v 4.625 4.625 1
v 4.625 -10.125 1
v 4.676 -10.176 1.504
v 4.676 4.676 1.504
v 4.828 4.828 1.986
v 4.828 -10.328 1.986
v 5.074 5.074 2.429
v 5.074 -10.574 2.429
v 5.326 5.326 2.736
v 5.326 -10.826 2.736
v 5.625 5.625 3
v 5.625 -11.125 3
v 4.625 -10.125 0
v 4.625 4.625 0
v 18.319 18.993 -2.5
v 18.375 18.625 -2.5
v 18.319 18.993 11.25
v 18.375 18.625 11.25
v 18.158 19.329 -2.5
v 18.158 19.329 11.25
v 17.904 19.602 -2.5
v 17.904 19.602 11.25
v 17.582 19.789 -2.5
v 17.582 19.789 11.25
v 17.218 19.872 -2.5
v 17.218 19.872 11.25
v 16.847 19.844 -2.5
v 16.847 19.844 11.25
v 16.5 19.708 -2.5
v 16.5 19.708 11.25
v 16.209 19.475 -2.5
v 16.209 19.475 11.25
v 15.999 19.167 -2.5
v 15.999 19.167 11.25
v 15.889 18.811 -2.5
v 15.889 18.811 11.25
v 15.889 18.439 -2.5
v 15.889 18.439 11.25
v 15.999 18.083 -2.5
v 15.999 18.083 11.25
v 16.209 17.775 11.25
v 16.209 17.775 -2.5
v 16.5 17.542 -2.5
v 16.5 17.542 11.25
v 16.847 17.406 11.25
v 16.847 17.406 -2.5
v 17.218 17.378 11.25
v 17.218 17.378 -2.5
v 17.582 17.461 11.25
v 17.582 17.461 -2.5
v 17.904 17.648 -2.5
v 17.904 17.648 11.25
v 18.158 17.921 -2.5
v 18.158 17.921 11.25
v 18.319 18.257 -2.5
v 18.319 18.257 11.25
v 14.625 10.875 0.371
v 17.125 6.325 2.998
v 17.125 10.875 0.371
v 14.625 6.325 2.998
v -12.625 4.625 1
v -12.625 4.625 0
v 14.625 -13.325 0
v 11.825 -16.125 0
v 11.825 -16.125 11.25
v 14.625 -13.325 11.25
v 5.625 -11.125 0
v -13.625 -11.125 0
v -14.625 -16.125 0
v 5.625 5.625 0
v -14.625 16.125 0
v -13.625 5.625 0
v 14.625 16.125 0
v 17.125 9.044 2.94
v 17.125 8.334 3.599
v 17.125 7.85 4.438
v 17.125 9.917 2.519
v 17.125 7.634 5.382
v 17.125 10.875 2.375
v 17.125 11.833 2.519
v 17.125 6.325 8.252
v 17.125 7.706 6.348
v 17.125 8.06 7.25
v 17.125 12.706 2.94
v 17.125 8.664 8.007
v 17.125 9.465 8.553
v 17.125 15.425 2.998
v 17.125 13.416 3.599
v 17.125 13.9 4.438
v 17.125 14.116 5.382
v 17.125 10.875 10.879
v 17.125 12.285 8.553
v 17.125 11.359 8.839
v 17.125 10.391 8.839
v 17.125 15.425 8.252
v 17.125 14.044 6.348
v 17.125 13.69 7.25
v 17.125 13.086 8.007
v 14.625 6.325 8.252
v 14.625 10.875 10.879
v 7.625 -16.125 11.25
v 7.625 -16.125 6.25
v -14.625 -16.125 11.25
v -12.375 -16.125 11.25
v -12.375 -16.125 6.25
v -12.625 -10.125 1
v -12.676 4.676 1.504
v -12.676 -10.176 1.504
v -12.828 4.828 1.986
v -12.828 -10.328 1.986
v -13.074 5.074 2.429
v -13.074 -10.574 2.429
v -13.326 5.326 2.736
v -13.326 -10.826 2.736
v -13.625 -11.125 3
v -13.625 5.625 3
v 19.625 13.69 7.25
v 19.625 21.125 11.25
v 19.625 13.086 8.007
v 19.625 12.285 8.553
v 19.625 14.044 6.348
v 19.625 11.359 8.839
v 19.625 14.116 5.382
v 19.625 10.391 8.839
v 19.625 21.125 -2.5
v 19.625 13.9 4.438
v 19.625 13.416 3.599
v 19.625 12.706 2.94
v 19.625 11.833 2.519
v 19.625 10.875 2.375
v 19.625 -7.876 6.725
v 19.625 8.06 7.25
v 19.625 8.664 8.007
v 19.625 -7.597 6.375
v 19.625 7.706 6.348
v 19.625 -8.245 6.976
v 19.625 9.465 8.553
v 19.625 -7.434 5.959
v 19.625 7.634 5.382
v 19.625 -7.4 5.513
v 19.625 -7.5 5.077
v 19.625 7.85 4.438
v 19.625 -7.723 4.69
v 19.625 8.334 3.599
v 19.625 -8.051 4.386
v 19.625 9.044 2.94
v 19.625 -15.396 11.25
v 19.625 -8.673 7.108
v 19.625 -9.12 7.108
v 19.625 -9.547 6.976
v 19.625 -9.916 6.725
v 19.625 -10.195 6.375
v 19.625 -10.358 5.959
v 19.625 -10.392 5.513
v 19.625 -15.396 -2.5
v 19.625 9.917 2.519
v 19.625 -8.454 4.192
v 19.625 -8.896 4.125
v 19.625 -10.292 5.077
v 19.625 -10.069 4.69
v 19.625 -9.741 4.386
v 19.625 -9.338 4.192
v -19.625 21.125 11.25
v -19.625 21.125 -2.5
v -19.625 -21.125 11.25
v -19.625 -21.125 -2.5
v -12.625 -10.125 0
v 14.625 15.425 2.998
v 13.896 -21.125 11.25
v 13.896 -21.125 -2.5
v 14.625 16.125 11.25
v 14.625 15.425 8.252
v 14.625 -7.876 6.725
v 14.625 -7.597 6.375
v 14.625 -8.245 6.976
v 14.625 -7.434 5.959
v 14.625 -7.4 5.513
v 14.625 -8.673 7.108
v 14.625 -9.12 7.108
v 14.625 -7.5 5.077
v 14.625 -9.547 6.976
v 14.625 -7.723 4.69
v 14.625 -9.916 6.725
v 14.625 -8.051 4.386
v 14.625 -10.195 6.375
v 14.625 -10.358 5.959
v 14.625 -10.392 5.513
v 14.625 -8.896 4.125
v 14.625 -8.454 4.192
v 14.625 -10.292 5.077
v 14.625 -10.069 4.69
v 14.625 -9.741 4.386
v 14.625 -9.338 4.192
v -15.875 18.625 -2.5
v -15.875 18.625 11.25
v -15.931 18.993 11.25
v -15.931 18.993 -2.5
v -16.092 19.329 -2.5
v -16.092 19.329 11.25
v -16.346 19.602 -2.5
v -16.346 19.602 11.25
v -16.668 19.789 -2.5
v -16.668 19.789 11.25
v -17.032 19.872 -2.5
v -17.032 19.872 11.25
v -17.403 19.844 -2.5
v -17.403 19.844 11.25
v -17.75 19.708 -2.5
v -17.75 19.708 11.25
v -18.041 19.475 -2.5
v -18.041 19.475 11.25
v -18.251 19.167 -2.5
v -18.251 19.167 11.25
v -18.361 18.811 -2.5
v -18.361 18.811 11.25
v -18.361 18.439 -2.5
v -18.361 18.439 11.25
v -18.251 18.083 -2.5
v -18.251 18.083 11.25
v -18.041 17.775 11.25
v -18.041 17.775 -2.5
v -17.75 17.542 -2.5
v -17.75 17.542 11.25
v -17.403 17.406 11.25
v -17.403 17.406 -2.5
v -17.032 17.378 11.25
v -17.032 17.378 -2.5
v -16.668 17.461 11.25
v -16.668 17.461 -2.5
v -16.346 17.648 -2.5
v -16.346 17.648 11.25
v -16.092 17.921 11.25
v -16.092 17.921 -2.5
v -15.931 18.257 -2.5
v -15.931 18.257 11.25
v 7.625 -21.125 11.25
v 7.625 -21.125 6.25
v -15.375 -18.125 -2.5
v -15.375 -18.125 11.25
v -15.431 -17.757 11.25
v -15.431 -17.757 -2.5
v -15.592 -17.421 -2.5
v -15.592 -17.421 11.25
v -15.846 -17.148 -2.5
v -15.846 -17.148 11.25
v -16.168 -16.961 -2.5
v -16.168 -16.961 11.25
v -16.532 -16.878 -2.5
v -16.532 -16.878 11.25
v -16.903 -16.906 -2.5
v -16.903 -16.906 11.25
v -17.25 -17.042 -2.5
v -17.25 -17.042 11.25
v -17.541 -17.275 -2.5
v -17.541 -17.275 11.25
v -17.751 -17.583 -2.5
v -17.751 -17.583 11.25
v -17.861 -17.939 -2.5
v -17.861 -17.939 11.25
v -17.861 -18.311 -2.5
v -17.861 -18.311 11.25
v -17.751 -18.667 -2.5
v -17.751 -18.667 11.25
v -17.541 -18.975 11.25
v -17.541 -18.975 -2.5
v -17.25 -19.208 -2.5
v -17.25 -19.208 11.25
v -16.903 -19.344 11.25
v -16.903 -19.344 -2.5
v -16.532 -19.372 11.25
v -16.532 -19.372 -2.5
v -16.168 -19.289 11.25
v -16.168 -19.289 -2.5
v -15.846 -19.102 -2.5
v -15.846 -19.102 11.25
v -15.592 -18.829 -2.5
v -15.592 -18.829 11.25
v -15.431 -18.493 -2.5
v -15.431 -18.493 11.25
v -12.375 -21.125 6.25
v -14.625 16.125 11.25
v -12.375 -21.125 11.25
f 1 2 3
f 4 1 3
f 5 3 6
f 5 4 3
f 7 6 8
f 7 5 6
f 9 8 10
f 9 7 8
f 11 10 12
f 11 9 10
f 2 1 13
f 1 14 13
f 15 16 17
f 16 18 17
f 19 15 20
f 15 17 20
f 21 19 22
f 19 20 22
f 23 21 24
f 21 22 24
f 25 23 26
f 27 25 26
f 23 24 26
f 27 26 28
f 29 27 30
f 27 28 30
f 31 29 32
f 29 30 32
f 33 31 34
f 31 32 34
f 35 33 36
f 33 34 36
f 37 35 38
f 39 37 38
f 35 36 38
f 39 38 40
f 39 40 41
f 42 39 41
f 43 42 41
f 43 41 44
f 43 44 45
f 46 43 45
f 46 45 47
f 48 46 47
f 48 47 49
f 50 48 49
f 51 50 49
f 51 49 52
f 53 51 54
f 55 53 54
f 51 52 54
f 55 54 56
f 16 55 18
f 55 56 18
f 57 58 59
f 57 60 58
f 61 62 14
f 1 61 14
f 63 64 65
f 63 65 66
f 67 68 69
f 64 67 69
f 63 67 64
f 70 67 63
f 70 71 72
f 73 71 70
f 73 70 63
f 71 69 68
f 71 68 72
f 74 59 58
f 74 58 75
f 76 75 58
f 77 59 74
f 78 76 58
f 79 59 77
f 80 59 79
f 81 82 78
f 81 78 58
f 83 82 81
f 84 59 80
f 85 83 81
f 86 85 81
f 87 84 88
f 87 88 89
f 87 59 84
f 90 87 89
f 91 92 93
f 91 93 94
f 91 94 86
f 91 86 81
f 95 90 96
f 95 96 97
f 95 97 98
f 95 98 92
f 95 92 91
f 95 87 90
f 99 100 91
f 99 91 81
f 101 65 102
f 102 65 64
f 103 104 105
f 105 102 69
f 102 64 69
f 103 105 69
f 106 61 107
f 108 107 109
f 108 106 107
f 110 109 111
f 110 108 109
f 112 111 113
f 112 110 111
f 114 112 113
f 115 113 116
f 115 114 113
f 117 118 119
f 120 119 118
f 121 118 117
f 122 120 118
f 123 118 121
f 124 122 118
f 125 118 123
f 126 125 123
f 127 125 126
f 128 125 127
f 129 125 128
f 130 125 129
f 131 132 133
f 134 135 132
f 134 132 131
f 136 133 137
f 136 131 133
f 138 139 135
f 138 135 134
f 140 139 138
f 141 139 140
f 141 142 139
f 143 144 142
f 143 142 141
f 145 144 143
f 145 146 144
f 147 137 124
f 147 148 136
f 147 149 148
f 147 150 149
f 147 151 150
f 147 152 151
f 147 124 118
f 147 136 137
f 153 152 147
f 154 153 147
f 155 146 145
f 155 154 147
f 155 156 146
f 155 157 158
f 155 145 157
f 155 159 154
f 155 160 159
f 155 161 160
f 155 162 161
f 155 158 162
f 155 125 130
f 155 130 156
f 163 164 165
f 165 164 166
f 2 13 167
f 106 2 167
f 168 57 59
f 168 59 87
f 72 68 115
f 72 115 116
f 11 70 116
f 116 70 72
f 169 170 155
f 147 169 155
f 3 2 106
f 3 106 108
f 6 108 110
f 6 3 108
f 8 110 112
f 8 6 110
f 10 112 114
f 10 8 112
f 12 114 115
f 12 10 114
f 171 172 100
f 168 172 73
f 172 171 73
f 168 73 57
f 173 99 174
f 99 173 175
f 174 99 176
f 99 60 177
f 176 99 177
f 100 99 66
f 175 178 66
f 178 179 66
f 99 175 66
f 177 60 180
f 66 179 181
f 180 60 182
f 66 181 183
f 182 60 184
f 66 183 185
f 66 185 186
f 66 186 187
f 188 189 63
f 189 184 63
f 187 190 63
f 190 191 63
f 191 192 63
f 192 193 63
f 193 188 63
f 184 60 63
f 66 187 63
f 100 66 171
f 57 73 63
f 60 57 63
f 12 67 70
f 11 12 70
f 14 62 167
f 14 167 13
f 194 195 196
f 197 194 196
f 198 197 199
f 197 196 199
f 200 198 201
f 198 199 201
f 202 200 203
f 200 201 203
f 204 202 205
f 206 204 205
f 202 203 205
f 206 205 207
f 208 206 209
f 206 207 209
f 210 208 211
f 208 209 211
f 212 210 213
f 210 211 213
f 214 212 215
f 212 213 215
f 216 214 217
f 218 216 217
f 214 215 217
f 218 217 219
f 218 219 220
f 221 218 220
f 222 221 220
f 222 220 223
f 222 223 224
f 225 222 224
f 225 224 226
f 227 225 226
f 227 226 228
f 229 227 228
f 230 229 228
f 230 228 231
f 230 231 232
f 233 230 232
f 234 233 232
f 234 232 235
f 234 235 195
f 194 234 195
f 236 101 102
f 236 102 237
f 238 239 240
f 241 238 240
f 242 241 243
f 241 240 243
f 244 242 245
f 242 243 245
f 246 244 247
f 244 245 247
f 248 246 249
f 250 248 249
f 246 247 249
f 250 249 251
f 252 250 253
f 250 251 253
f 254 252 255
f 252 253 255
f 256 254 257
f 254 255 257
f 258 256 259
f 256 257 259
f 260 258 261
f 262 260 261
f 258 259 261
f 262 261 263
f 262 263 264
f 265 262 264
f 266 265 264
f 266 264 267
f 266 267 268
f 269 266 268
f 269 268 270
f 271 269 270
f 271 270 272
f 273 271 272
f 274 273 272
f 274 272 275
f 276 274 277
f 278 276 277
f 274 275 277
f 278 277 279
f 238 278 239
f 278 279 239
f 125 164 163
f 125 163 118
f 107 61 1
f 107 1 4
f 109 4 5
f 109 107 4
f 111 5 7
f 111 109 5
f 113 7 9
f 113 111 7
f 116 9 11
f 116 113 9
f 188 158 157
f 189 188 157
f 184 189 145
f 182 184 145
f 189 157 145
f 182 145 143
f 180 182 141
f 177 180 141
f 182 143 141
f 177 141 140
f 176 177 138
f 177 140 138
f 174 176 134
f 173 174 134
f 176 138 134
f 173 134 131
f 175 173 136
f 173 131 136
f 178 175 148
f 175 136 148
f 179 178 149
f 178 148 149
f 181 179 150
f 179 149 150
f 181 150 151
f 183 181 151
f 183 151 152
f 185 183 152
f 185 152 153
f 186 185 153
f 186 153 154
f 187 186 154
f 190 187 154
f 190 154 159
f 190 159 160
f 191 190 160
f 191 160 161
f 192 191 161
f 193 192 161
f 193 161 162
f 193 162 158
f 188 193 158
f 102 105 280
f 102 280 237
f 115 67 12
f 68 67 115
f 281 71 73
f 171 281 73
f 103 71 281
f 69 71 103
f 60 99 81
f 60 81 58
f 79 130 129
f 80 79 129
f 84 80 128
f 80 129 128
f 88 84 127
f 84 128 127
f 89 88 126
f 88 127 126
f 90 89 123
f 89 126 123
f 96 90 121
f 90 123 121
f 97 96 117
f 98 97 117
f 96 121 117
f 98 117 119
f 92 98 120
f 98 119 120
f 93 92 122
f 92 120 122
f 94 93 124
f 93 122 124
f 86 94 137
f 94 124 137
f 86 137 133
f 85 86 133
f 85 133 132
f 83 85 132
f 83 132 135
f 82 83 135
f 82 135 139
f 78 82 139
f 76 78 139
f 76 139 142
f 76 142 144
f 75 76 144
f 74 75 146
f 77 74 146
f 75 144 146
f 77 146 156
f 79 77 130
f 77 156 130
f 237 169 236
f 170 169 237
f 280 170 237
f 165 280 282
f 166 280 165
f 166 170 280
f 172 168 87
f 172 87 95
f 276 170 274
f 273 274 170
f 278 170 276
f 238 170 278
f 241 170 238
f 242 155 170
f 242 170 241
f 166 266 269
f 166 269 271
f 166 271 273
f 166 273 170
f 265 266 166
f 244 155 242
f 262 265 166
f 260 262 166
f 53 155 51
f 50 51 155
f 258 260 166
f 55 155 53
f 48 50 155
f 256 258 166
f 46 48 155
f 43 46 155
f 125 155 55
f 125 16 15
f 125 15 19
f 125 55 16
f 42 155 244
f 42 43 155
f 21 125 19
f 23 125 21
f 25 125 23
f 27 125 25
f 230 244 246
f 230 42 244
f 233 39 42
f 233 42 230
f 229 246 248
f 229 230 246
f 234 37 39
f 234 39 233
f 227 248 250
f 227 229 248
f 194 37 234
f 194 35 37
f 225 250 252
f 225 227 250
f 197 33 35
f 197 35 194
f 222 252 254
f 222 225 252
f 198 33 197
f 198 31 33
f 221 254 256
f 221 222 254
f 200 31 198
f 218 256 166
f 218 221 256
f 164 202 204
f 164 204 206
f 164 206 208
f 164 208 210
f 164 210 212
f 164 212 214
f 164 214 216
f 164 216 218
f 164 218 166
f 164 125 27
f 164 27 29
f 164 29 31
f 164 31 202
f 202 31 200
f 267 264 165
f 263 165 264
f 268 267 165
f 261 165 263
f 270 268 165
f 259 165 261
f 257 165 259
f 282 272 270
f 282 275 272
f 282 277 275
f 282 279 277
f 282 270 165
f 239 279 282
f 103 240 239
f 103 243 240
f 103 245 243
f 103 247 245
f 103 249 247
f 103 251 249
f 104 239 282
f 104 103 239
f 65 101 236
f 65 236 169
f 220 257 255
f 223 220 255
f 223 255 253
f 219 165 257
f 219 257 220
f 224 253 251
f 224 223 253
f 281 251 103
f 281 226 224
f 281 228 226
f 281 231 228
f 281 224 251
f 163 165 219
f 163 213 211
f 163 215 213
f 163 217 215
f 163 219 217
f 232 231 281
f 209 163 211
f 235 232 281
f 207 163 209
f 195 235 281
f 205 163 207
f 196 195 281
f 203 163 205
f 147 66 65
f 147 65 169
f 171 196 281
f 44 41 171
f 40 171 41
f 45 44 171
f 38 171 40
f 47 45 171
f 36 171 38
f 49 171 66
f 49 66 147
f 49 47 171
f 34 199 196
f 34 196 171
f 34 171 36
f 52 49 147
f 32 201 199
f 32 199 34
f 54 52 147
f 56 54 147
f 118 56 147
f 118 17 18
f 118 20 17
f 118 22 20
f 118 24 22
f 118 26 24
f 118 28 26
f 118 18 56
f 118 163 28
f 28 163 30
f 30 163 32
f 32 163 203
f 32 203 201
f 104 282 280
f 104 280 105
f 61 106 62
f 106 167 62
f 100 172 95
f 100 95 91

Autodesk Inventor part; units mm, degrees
ref_plane "YZ Plane" through (0, 0, 0) normal (1, 0, 0) x (0, 1, 0)
ref_plane "XZ Plane" through (0, 0, 0) normal (0, 1, 0) x (-1, 0, 0)
ref_plane "XY Plane" through (0, 0, 0) normal (0, 0, 1) x (1, 0, 0)
sketch "Sketch1" plane through (0, 0, 0) normal (0, 0, 1) x (1, 0, 0)
  line L0 (11.825, -16.125) -> (-11.825, -16.125)
  line L1 (-14.625, -13.325) -> (-14.625, 16.125)
  line L2 (-14.625, 16.125) -> (14.625, 16.125)
  line L3 (14.625, 16.125) -> (14.625, -13.325)
  line L4 (14.625, -16.125) -> (-14.625, 16.125) construction
  line L5 (-14.625, -16.125) -> (14.625, 16.125) construction
  line L6 (11.825, -16.125) -> (14.625, -13.325)
  line L7 (-14.625, -13.325) -> (-14.625, -16.125)
  line L8 (-11.825, -16.125) -> (-14.625, -16.125)
  point P0 (0, 0)
  dimension "d0" = 29.25
  dimension "d1" = 32.25
  dimension "d56" = 2.8
  dimension "d57" = 2.8
extrude "Extrusion1" add sketch "Sketch1" along normal blind 11.25
shell "Shell2" thickness 5 outward yes removed faces 1 at (-4.875, -3.5083, 11.25)
sketch "Sketch3" plane through (0, 0, 11.25) normal (0, 0, 1) x (1, 0, 0)
  line L0 (19.625, 21.125) -> (-19.625, 21.125) construction
  line L1 (-14.625, 16.125) -> (14.625, 16.125) construction
  line L2 (-19.625, 21.125) -> (-14.625, 16.125) construction
  line L3 (14.625, 16.125) -> (19.625, 21.125) construction
  line L4 (11.825, -16.125) -> (-14.625, -16.125) construction
  circle A0 centre (-17.125, 18.625) radius 1.25
  circle A1 centre (17.125, 18.625) radius 1.25
  line L5 (-14.625, -16.125) -> (-14.625, 16.125) construction
  line L6 (-14.625, -16.125) -> (-18.625, -20.125) construction
  circle A2 centre (-16.625, -18.125) radius 1.25
  point P0 (0, 0)
  point P1 (18.625, -20.125)
  point P2 (14.625, -16.125)
  point P3 (-11.825, -16.125)
  dimension "d14" = 2.5
  dimension "d15" = 2.5
  dimension "d58" = 2.5
extrude "Extrusion3" cut sketch "Sketch3" against normal through all
sketch "Sketch11" plane through (0, 0, 11.25) normal (0, 0, 1) x (1, 0, 0)
  line L0 (-19.625, -21.125) -> (13.8961, -21.125) projected
  line L1 (-14.625, -16.125) -> (11.825, -16.125) projected
  line L2 (7.625, -21.125) -> (-12.375, -21.125)
  line L3 (-12.375, -21.125) -> (-12.375, -16.125)
  line L4 (-12.375, -16.125) -> (7.625, -16.125)
  line L5 (7.625, -16.125) -> (7.625, -21.125)
  circle A0 centre (-16.625, -18.125) radius 1.25 projected
  line L6 (-19.625, 21.125) -> (-19.625, -21.125) projected
  point P0 (0, 0)
  point P1 (-13.4819, -20.125)
  point P2 (18.625, -20.125)
  point P3 (-11.825, -16.125)
  point P4 (14.625, -16.125)
  point P5 (13.8961, -21.125)
  point P6 (7.625, -16.125)
  dimension "d60" = 20
  dimension "d87" = 7.25
extrude "Extrusion11" cut sketch "Sketch11" against normal blind 5 contours L3 L1 L5 L0
sketch "Sketch13" plane through (19.625, -15.3961, -5) normal (1, 0, 0) x (0, 0, -1)
  line L0 (-11.5, 18.8569) -> (-11.5, 3.8569) construction
  circle A0 centre (-10.625, 26.2711) radius 3.25
  line L1 (-16.25, 0) -> (-16.25, 36.5211) construction
  line L2 (0, 0) -> (-16.25, 0) construction
  line L3 (0, 36.5211) -> (-16.25, 36.5211) projected
  line L4 (-5, 2.0711) -> (-5, 31.5211) projected
  point P0 (-5, 15.3961)
  dimension "d61" = 6.5
  dimension "d81" = 10.25
  dimension "d86" = 5.625
extrude "Extrusion13" cut sketch "Sketch13" against normal up to surface (5 mm away)
sketch "Sketch14" plane through (-14.625, 16.125, 0) normal (0, 0, 1) x (1, 0, 0)
  line L0 (2, -11.5) -> (19.25, -11.5)
  line L1 (19.25, -11.5) -> (19.25, -26.25)
  line L2 (19.25, -26.25) -> (2, -26.25)
  line L3 (2, -26.25) -> (2, -11.5)
  line L4 (1.25, -10.5) -> (20, -10.5)
  line L5 (20.25, -11.25) -> (20.25, -27)
  line L6 (19.45, -27.25) -> (1.25, -27.25)
  line L7 (1, -27) -> (1, -10.75)
  line L8 (0, -32.25) -> (0, 0) projected
  line L9 (2.25, -32.25) -> (0, -32.25) projected
  line L10 (20, -10.5) -> (20.25, -10.5)
  line L11 (20.25, -10.5) -> (20.25, -11.25)
  line L12 (19.45, -27.25) -> (20.25, -27.25)
  line L13 (20.25, -27.25) -> (20.25, -27)
  line L14 (1.25, -27.25) -> (1, -27.25)
  line L15 (1, -27) -> (1, -27.25)
  line L16 (1, -10.75) -> (1, -10.5)
  line L17 (1.25, -10.5) -> (1, -10.5)
  point P0 (14.625, -16.125)
  point P1 (10.625, -11.5)
  point P2 (10.625, -10.5)
  point P3 (1, -18.875)
  point P4 (2, -18.875)
  dimension "d66" = 1
  dimension "d67" = 1
  dimension "d69" = 17.25
  dimension "d70" = 14.75
  dimension "d71" = 1
  dimension "d72" = 5
  dimension "d83" = 1
  dimension "d84" = 1
extrude "Extrusion14" add sketch "Sketch14" along normal blind 3
sketch "Sketch15" plane through (0, 0, -5) normal (0, 0, -1) x (-1, 0, 0)
  line L0 (-19.625, -15.3961) -> (-19.625, 21.125) projected
  line L1 (19.625, -21.125) -> (-13.8961, -21.125) projected
  line L2 (-19.625, 21.125) -> (19.625, 21.125)
  line L3 (19.625, 21.125) -> (19.625, -21.125)
  line L4 (19.625, -21.125) -> (-19.625, -21.125)
  line L5 (-19.625, -21.125) -> (-19.625, 21.125)
  point P0 (0, 0)
extrude "Extrusion15" cut sketch "Sketch15" against normal blind 2.5
sketch "Sketch16" plane through (19.625, -15.3961, 11.25) normal (1, 0, 0) x (0, 0, -1)
  point P0 (11.25, 15.3961)
sketch "Sketch17" plane through (19.625, -15.3961, 11.25) normal (1, 0, 0) x (0, 0, -1)
  circle A0 centre (5.625, 6.5) radius 1.5
  circle A1 centre (5.625, 26.2711) radius 3.25 projected
  line L0 (13.75, 0) -> (0, 0) projected
  point P0 (11.25, 15.3961)
  point P1 (0.8377, 31.1069)
  point P2 (7.1623, 31.1069)
  dimension "d77" = 3
  dimension "d82" = 6.5
extrude "Extrusion16" cut sketch "Sketch17" against normal up to surface (5 mm away) contours A0
fillet "Fillet1" radius 2.5 4 edges at (-4, 4.625, 3) (-12.625, -2.75, 3) (-4, -10.125, 3) (4.625, -2.75, 3)
sketch "Sketch18" plane through (14.625, -13.325, 0) normal (-1, 0, 0) x (0, 0, 1)
  circle A0 centre (5.625, 24.2) radius 3.25 construction
  circle A1 centre (5.625, 24.2) radius 4.55 construction
  line L0 (7.0809, 28.75) -> (11.4566, 28.75) construction
  line L1 (5.625, 28.75) -> (5.625, 19.65) construction
  line L2 (1.075, 24.2) -> (10.175, 24.2) construction
  line L3 (5.625, 24.2) -> (10.175, 24.2) construction
  line L4 (10.175, 24.2) -> (11.25, 24.2) construction
  line L5 (11.25, 29.45) -> (11.25, 0) construction
  line L6 (8.2519, 28.75) -> (10.8789, 24.2)
  line L7 (10.8789, 24.2) -> (8.2519, 19.65)
  line L8 (8.2519, 19.65) -> (2.9981, 19.65)
  line L9 (2.9981, 19.65) -> (0.3711, 24.2)
  line L10 (0.3711, 24.2) -> (2.9981, 28.75)
  line L11 (2.9981, 28.75) -> (8.2519, 28.75)
  point P0 (0, 13.325)
  point P1 (9.0965, 27.1413)
  dimension "d88" = 9.1
extrude "Extrusion17" cut sketch "Sketch18" against normal blind 2.5
equation "\"d57\" = d56"
equation "\"d58\" = d14"
equation "\"d86\" = 0.5 * d4"
equation "\"d71\" = d67"
equation "\"d83\" = d67"
equation "\"d84\" = d67"
equation "\"d92\" = 0.5 * d13"
equation "\"d4\" = 11.25"
equation "\"d13\" = 5"
properties part number "AmpClipOn"
